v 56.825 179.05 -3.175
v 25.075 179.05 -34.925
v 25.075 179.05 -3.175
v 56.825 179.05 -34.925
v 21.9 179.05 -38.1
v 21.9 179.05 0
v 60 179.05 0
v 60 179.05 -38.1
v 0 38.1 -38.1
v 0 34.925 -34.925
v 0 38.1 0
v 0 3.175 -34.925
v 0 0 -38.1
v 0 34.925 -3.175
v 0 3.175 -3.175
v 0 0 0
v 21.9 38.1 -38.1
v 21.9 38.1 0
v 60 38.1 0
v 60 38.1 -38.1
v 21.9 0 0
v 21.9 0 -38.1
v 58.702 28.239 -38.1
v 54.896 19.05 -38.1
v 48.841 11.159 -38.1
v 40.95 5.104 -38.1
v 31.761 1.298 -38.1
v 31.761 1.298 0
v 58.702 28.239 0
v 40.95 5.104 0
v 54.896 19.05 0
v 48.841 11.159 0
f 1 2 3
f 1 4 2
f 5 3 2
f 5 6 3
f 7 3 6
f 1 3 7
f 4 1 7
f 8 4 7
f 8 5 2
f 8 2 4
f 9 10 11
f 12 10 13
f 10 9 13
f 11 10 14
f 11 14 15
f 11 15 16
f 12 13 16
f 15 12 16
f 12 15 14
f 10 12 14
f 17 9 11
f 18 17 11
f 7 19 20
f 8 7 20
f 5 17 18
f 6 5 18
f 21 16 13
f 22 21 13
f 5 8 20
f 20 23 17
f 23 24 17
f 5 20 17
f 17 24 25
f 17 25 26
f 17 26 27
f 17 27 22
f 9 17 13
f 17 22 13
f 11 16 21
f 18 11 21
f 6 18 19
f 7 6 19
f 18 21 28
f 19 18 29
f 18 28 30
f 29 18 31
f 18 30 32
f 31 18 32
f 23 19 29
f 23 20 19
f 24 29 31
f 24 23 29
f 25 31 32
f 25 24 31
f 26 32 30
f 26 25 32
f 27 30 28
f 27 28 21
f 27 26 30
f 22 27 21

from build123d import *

# Parameters (mm, degrees)
SKETCH1_W   = 38.1
SKETCH1_H   = 38.1
SKETCH1_W_2 = 31.75
SKETCH1_H_2 = 31.75
SKETCH3_W   = 31.75
SKETCH3_H   = 31.75


with BuildPart() as part:
    # Sweep1: sweep along a path in Sketch2
    with BuildLine(Plane.XY) as sweep1_path:
        Line((40.95, 179.05), (40.95, 38.1))
        ThreePointArc((40.95, 38.1), (35.370384182, 24.629615818), (21.9, 19.05))
        Line((21.9, 19.05), (0, 19.05))
    # Sketch1 → Sweep1 (sweep)
    with BuildSketch(Plane(origin=(0, 0, 0), x_dir=(0, 0, -1), z_dir=(1, 0, 0))):
        with Locations((19.05, 19.05)):
            Rectangle(SKETCH1_W, SKETCH1_H)
        with Locations((19.05, 19.05)):
            Rectangle(SKETCH1_W_2, SKETCH1_H_2, mode=Mode.SUBTRACT)
    sweep(path=sweep1_path.line)

    # Sweep2: sweep along a path in Sketch2<2>
    with BuildLine(Plane.XY) as sweep2_path:
        Line((40.95, 179.05), (40.95, 38.1))
        ThreePointArc((40.95, 38.1), (35.370384182, 24.629615818), (21.9, 19.05))
        Line((21.9, 19.05), (0, 19.05))
    # Sketch3 → Sweep2 (sweep)
    with BuildSketch(Plane(origin=(0, 179.05, 0), x_dir=(1, 0, 0), z_dir=(0, 1, 0))):
        with Locations((40.95, 19.05)):
            Rectangle(SKETCH3_W, SKETCH3_H)
    sweep(path=sweep2_path.line)


solid = part.part
